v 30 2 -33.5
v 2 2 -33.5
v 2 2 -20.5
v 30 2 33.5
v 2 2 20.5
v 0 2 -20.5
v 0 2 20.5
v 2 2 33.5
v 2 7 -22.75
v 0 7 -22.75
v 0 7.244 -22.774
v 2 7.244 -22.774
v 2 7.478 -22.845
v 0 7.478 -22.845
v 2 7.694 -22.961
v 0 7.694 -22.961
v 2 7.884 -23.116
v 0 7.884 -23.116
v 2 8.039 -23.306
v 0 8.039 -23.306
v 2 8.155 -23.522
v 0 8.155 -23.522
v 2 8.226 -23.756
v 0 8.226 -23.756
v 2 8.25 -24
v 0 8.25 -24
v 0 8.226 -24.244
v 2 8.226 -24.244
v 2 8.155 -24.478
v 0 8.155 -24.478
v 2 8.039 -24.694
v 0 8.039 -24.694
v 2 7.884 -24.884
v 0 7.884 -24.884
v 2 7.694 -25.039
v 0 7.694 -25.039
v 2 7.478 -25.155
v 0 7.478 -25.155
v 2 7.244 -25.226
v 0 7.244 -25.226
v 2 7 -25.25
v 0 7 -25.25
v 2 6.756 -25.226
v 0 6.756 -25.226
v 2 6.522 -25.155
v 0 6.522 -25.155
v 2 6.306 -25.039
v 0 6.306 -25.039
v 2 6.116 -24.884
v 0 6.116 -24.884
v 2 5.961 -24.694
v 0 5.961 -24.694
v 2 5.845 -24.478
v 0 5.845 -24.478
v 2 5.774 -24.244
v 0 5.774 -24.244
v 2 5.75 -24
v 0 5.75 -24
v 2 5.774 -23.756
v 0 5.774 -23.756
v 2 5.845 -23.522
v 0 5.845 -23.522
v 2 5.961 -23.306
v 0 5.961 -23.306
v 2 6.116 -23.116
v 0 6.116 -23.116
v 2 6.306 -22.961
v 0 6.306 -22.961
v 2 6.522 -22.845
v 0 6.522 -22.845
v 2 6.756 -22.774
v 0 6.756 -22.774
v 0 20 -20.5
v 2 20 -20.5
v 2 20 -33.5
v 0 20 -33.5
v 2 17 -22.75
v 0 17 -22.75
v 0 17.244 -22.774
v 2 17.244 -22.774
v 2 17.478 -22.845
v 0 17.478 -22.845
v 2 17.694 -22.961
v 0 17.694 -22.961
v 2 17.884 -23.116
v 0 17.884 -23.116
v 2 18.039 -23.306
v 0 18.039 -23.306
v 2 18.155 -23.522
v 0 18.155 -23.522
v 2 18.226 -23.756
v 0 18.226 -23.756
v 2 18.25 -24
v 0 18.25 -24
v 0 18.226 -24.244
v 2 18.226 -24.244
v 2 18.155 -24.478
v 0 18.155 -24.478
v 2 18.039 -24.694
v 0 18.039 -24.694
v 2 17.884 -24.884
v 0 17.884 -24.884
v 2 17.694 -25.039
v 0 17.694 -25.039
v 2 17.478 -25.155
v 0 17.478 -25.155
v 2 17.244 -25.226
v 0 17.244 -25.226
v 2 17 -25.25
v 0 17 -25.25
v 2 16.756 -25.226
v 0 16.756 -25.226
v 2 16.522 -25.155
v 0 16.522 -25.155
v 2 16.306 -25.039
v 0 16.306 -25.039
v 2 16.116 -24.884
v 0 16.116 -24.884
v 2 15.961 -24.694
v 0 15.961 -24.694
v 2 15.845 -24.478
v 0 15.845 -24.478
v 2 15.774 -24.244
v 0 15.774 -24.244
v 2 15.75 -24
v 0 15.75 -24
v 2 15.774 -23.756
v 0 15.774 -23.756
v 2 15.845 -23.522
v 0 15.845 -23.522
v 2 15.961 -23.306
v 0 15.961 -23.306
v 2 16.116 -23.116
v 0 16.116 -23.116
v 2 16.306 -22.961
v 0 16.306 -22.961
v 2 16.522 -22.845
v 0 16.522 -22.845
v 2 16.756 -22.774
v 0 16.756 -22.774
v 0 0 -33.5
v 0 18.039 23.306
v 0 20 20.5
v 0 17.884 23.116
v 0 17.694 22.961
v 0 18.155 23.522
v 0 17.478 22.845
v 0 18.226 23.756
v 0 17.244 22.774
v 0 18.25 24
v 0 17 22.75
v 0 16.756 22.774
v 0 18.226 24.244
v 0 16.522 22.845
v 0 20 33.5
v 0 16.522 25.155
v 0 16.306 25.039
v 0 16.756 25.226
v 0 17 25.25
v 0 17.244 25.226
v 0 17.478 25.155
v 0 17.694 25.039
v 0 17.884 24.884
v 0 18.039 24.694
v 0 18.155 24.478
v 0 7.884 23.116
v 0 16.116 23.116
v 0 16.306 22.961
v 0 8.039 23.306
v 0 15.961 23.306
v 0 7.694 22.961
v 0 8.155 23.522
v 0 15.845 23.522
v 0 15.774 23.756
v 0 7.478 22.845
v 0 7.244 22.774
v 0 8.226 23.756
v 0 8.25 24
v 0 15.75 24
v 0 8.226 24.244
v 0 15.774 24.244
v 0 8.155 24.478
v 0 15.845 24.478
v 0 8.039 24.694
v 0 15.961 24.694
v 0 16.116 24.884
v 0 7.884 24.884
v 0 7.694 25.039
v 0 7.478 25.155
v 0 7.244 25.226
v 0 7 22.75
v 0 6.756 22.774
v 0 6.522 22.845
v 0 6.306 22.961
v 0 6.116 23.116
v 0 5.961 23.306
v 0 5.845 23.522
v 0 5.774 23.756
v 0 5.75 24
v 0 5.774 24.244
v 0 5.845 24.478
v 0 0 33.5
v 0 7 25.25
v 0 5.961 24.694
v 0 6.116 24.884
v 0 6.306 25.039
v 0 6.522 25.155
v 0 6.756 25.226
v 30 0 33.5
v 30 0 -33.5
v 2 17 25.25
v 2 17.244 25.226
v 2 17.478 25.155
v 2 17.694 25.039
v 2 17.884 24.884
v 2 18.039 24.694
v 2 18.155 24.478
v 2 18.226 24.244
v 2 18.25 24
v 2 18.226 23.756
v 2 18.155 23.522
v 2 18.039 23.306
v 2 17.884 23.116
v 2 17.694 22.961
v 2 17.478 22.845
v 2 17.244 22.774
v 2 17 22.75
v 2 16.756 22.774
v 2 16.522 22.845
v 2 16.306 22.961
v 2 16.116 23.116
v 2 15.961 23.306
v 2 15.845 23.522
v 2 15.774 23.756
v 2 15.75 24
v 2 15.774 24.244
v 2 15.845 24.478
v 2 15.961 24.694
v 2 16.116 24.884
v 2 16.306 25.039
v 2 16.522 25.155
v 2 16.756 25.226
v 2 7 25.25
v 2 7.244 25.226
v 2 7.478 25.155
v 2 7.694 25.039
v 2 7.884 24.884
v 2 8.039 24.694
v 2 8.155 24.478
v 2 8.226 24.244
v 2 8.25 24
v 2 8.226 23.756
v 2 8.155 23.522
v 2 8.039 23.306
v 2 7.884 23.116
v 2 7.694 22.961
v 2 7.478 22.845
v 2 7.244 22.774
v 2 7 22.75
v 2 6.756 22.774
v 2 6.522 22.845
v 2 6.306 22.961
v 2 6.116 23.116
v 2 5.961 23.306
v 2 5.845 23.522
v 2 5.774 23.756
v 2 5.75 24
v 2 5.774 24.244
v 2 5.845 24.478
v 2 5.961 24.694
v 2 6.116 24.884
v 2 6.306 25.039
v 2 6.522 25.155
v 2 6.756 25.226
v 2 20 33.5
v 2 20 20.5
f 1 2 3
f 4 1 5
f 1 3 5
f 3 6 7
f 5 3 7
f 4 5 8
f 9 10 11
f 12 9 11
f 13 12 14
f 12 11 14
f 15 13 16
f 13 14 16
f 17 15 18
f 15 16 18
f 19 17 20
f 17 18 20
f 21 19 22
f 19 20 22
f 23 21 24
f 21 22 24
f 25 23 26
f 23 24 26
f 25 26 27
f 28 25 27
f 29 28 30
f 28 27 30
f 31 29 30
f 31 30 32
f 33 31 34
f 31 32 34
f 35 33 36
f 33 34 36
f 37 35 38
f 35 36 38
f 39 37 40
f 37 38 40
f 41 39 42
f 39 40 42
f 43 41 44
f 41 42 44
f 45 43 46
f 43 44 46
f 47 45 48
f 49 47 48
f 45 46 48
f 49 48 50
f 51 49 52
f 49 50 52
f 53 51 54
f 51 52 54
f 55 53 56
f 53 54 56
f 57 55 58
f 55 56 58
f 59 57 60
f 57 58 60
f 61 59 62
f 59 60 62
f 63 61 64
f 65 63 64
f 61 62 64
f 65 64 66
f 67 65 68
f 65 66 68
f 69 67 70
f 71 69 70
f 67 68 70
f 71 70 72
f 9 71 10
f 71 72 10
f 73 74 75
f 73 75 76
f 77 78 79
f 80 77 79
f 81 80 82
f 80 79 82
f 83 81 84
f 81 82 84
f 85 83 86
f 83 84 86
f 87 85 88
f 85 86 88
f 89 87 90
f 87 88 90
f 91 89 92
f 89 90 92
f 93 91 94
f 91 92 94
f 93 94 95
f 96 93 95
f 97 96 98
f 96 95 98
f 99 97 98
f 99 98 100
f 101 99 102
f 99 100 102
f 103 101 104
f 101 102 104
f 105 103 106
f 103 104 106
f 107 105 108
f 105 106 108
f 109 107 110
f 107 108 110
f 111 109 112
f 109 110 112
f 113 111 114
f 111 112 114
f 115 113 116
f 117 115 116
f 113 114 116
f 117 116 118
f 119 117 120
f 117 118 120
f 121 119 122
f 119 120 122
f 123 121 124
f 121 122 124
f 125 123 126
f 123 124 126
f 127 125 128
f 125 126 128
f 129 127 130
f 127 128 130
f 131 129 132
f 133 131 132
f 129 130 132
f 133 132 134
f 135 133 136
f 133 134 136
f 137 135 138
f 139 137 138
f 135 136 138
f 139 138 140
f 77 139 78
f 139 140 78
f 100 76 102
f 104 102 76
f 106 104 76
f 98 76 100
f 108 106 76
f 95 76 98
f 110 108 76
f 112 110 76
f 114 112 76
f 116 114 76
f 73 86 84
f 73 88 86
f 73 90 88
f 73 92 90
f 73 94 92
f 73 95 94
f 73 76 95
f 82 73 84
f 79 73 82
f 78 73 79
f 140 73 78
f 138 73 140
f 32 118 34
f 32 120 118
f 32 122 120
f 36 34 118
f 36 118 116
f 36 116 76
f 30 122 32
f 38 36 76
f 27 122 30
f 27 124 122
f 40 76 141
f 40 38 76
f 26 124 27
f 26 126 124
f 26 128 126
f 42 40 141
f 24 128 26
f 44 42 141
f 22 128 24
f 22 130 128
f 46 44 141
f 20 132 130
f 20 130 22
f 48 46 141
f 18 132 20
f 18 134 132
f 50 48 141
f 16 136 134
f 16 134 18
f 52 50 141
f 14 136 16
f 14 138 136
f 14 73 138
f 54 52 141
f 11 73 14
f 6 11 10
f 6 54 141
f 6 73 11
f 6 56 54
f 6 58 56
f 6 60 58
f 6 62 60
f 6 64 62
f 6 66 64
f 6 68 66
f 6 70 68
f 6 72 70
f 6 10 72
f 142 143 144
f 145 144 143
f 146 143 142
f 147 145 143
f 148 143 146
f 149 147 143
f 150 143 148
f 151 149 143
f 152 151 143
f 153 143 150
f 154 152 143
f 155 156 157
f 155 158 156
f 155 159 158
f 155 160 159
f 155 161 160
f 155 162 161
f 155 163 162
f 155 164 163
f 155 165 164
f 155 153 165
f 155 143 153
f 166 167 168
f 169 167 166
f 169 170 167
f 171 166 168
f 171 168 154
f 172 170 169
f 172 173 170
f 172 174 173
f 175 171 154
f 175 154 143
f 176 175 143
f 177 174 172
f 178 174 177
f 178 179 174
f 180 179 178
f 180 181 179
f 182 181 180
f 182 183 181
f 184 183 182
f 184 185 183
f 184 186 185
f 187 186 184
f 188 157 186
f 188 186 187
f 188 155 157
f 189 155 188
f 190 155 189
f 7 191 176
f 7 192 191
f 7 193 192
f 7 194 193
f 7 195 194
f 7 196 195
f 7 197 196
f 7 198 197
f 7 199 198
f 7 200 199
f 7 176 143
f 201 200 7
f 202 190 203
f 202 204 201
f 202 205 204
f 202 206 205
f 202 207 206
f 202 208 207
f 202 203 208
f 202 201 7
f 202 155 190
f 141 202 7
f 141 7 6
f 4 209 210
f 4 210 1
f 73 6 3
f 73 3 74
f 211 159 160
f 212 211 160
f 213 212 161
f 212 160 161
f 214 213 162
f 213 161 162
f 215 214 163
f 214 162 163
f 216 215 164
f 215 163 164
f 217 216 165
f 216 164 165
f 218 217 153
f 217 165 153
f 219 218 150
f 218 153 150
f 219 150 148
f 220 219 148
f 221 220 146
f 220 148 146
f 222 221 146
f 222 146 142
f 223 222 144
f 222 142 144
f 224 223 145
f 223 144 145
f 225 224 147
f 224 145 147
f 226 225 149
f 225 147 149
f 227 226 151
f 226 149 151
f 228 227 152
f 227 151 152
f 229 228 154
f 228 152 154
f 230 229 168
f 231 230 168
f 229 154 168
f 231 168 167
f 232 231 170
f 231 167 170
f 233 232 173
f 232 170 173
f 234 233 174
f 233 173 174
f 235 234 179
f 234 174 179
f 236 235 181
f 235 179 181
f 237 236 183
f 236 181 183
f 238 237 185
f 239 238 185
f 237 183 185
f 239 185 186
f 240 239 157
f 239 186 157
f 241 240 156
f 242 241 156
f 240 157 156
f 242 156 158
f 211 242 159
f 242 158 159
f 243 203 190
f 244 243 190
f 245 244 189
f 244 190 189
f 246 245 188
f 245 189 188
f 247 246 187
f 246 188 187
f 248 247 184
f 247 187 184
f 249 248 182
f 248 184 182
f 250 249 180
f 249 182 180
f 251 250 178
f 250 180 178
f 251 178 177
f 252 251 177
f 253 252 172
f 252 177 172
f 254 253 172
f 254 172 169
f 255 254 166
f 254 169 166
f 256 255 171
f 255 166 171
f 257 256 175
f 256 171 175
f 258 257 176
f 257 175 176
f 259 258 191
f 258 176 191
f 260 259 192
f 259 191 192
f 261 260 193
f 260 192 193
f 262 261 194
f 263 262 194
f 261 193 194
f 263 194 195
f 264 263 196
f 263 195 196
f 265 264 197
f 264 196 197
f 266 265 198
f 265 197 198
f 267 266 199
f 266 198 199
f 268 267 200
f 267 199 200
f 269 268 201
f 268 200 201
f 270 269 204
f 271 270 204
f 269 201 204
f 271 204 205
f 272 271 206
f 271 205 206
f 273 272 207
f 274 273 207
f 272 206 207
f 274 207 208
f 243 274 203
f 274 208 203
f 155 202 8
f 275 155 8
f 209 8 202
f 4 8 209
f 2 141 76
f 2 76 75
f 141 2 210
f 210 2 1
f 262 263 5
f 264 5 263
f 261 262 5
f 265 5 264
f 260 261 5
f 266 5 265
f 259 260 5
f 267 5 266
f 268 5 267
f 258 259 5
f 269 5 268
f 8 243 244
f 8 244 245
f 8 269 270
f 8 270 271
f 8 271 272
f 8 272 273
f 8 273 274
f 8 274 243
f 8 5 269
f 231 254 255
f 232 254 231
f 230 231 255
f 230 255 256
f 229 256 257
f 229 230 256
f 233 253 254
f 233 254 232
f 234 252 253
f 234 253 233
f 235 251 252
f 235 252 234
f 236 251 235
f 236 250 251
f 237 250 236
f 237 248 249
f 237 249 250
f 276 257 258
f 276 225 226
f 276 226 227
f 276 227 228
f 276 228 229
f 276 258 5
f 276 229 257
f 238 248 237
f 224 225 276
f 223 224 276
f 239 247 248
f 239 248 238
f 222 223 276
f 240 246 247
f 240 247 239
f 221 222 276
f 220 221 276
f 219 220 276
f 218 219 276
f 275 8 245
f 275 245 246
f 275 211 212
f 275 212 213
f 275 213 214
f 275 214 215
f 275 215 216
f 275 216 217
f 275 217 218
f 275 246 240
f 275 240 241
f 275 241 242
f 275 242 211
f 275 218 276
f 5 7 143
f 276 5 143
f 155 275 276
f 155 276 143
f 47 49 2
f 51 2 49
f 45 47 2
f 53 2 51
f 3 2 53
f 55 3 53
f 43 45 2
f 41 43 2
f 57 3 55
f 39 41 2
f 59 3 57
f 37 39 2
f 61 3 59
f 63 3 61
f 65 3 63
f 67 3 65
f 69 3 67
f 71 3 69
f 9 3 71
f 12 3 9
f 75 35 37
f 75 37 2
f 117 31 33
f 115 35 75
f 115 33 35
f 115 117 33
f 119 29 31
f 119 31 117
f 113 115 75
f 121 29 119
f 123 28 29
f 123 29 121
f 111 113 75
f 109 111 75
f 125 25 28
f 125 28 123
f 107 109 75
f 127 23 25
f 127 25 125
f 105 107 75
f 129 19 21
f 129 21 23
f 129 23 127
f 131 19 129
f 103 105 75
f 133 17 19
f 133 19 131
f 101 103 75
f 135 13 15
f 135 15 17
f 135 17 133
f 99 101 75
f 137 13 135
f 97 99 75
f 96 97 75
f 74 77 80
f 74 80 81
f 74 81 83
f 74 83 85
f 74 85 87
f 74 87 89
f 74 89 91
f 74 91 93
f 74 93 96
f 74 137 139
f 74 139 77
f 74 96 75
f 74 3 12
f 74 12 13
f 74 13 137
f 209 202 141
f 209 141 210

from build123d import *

# Parameters (mm, degrees)
EXTRU_MINCE1_DEPTH      = 33.5
ESQUISSE2_R             = 1.25
ESQUISSE2_W             = 41
ESQUISSE2_H             = 18
ENL_V_MAT_EXTRU_1_DEPTH = 2


with BuildPart() as part:
    # Esquisse1 → Extru.-Mince1 (new, symmetric)
    with BuildSketch(Plane.XY):
        Polygon((0, 20), (0, 0), (30, 0), (30, 2), (2, 2), (2, 20), align=None)
    extrude(amount=EXTRU_MINCE1_DEPTH, both=True)

    # Esquisse2 → Enlèv. mat.-Extru.1 (cut)
    with BuildSketch(Plane.ZY):
        with Locations((-24, 7)):
            Circle(ESQUISSE2_R)
        with Locations((24, 7)):
            Circle(ESQUISSE2_R)
        with Locations((24, 17)):
            Circle(ESQUISSE2_R)
        with Locations((-24, 17)):
            Circle(ESQUISSE2_R)
        with Locations((0, 11)):
            Rectangle(ESQUISSE2_W, ESQUISSE2_H)
    extrude(amount=-ENL_V_MAT_EXTRU_1_DEPTH, mode=Mode.SUBTRACT)


solid = part.part
